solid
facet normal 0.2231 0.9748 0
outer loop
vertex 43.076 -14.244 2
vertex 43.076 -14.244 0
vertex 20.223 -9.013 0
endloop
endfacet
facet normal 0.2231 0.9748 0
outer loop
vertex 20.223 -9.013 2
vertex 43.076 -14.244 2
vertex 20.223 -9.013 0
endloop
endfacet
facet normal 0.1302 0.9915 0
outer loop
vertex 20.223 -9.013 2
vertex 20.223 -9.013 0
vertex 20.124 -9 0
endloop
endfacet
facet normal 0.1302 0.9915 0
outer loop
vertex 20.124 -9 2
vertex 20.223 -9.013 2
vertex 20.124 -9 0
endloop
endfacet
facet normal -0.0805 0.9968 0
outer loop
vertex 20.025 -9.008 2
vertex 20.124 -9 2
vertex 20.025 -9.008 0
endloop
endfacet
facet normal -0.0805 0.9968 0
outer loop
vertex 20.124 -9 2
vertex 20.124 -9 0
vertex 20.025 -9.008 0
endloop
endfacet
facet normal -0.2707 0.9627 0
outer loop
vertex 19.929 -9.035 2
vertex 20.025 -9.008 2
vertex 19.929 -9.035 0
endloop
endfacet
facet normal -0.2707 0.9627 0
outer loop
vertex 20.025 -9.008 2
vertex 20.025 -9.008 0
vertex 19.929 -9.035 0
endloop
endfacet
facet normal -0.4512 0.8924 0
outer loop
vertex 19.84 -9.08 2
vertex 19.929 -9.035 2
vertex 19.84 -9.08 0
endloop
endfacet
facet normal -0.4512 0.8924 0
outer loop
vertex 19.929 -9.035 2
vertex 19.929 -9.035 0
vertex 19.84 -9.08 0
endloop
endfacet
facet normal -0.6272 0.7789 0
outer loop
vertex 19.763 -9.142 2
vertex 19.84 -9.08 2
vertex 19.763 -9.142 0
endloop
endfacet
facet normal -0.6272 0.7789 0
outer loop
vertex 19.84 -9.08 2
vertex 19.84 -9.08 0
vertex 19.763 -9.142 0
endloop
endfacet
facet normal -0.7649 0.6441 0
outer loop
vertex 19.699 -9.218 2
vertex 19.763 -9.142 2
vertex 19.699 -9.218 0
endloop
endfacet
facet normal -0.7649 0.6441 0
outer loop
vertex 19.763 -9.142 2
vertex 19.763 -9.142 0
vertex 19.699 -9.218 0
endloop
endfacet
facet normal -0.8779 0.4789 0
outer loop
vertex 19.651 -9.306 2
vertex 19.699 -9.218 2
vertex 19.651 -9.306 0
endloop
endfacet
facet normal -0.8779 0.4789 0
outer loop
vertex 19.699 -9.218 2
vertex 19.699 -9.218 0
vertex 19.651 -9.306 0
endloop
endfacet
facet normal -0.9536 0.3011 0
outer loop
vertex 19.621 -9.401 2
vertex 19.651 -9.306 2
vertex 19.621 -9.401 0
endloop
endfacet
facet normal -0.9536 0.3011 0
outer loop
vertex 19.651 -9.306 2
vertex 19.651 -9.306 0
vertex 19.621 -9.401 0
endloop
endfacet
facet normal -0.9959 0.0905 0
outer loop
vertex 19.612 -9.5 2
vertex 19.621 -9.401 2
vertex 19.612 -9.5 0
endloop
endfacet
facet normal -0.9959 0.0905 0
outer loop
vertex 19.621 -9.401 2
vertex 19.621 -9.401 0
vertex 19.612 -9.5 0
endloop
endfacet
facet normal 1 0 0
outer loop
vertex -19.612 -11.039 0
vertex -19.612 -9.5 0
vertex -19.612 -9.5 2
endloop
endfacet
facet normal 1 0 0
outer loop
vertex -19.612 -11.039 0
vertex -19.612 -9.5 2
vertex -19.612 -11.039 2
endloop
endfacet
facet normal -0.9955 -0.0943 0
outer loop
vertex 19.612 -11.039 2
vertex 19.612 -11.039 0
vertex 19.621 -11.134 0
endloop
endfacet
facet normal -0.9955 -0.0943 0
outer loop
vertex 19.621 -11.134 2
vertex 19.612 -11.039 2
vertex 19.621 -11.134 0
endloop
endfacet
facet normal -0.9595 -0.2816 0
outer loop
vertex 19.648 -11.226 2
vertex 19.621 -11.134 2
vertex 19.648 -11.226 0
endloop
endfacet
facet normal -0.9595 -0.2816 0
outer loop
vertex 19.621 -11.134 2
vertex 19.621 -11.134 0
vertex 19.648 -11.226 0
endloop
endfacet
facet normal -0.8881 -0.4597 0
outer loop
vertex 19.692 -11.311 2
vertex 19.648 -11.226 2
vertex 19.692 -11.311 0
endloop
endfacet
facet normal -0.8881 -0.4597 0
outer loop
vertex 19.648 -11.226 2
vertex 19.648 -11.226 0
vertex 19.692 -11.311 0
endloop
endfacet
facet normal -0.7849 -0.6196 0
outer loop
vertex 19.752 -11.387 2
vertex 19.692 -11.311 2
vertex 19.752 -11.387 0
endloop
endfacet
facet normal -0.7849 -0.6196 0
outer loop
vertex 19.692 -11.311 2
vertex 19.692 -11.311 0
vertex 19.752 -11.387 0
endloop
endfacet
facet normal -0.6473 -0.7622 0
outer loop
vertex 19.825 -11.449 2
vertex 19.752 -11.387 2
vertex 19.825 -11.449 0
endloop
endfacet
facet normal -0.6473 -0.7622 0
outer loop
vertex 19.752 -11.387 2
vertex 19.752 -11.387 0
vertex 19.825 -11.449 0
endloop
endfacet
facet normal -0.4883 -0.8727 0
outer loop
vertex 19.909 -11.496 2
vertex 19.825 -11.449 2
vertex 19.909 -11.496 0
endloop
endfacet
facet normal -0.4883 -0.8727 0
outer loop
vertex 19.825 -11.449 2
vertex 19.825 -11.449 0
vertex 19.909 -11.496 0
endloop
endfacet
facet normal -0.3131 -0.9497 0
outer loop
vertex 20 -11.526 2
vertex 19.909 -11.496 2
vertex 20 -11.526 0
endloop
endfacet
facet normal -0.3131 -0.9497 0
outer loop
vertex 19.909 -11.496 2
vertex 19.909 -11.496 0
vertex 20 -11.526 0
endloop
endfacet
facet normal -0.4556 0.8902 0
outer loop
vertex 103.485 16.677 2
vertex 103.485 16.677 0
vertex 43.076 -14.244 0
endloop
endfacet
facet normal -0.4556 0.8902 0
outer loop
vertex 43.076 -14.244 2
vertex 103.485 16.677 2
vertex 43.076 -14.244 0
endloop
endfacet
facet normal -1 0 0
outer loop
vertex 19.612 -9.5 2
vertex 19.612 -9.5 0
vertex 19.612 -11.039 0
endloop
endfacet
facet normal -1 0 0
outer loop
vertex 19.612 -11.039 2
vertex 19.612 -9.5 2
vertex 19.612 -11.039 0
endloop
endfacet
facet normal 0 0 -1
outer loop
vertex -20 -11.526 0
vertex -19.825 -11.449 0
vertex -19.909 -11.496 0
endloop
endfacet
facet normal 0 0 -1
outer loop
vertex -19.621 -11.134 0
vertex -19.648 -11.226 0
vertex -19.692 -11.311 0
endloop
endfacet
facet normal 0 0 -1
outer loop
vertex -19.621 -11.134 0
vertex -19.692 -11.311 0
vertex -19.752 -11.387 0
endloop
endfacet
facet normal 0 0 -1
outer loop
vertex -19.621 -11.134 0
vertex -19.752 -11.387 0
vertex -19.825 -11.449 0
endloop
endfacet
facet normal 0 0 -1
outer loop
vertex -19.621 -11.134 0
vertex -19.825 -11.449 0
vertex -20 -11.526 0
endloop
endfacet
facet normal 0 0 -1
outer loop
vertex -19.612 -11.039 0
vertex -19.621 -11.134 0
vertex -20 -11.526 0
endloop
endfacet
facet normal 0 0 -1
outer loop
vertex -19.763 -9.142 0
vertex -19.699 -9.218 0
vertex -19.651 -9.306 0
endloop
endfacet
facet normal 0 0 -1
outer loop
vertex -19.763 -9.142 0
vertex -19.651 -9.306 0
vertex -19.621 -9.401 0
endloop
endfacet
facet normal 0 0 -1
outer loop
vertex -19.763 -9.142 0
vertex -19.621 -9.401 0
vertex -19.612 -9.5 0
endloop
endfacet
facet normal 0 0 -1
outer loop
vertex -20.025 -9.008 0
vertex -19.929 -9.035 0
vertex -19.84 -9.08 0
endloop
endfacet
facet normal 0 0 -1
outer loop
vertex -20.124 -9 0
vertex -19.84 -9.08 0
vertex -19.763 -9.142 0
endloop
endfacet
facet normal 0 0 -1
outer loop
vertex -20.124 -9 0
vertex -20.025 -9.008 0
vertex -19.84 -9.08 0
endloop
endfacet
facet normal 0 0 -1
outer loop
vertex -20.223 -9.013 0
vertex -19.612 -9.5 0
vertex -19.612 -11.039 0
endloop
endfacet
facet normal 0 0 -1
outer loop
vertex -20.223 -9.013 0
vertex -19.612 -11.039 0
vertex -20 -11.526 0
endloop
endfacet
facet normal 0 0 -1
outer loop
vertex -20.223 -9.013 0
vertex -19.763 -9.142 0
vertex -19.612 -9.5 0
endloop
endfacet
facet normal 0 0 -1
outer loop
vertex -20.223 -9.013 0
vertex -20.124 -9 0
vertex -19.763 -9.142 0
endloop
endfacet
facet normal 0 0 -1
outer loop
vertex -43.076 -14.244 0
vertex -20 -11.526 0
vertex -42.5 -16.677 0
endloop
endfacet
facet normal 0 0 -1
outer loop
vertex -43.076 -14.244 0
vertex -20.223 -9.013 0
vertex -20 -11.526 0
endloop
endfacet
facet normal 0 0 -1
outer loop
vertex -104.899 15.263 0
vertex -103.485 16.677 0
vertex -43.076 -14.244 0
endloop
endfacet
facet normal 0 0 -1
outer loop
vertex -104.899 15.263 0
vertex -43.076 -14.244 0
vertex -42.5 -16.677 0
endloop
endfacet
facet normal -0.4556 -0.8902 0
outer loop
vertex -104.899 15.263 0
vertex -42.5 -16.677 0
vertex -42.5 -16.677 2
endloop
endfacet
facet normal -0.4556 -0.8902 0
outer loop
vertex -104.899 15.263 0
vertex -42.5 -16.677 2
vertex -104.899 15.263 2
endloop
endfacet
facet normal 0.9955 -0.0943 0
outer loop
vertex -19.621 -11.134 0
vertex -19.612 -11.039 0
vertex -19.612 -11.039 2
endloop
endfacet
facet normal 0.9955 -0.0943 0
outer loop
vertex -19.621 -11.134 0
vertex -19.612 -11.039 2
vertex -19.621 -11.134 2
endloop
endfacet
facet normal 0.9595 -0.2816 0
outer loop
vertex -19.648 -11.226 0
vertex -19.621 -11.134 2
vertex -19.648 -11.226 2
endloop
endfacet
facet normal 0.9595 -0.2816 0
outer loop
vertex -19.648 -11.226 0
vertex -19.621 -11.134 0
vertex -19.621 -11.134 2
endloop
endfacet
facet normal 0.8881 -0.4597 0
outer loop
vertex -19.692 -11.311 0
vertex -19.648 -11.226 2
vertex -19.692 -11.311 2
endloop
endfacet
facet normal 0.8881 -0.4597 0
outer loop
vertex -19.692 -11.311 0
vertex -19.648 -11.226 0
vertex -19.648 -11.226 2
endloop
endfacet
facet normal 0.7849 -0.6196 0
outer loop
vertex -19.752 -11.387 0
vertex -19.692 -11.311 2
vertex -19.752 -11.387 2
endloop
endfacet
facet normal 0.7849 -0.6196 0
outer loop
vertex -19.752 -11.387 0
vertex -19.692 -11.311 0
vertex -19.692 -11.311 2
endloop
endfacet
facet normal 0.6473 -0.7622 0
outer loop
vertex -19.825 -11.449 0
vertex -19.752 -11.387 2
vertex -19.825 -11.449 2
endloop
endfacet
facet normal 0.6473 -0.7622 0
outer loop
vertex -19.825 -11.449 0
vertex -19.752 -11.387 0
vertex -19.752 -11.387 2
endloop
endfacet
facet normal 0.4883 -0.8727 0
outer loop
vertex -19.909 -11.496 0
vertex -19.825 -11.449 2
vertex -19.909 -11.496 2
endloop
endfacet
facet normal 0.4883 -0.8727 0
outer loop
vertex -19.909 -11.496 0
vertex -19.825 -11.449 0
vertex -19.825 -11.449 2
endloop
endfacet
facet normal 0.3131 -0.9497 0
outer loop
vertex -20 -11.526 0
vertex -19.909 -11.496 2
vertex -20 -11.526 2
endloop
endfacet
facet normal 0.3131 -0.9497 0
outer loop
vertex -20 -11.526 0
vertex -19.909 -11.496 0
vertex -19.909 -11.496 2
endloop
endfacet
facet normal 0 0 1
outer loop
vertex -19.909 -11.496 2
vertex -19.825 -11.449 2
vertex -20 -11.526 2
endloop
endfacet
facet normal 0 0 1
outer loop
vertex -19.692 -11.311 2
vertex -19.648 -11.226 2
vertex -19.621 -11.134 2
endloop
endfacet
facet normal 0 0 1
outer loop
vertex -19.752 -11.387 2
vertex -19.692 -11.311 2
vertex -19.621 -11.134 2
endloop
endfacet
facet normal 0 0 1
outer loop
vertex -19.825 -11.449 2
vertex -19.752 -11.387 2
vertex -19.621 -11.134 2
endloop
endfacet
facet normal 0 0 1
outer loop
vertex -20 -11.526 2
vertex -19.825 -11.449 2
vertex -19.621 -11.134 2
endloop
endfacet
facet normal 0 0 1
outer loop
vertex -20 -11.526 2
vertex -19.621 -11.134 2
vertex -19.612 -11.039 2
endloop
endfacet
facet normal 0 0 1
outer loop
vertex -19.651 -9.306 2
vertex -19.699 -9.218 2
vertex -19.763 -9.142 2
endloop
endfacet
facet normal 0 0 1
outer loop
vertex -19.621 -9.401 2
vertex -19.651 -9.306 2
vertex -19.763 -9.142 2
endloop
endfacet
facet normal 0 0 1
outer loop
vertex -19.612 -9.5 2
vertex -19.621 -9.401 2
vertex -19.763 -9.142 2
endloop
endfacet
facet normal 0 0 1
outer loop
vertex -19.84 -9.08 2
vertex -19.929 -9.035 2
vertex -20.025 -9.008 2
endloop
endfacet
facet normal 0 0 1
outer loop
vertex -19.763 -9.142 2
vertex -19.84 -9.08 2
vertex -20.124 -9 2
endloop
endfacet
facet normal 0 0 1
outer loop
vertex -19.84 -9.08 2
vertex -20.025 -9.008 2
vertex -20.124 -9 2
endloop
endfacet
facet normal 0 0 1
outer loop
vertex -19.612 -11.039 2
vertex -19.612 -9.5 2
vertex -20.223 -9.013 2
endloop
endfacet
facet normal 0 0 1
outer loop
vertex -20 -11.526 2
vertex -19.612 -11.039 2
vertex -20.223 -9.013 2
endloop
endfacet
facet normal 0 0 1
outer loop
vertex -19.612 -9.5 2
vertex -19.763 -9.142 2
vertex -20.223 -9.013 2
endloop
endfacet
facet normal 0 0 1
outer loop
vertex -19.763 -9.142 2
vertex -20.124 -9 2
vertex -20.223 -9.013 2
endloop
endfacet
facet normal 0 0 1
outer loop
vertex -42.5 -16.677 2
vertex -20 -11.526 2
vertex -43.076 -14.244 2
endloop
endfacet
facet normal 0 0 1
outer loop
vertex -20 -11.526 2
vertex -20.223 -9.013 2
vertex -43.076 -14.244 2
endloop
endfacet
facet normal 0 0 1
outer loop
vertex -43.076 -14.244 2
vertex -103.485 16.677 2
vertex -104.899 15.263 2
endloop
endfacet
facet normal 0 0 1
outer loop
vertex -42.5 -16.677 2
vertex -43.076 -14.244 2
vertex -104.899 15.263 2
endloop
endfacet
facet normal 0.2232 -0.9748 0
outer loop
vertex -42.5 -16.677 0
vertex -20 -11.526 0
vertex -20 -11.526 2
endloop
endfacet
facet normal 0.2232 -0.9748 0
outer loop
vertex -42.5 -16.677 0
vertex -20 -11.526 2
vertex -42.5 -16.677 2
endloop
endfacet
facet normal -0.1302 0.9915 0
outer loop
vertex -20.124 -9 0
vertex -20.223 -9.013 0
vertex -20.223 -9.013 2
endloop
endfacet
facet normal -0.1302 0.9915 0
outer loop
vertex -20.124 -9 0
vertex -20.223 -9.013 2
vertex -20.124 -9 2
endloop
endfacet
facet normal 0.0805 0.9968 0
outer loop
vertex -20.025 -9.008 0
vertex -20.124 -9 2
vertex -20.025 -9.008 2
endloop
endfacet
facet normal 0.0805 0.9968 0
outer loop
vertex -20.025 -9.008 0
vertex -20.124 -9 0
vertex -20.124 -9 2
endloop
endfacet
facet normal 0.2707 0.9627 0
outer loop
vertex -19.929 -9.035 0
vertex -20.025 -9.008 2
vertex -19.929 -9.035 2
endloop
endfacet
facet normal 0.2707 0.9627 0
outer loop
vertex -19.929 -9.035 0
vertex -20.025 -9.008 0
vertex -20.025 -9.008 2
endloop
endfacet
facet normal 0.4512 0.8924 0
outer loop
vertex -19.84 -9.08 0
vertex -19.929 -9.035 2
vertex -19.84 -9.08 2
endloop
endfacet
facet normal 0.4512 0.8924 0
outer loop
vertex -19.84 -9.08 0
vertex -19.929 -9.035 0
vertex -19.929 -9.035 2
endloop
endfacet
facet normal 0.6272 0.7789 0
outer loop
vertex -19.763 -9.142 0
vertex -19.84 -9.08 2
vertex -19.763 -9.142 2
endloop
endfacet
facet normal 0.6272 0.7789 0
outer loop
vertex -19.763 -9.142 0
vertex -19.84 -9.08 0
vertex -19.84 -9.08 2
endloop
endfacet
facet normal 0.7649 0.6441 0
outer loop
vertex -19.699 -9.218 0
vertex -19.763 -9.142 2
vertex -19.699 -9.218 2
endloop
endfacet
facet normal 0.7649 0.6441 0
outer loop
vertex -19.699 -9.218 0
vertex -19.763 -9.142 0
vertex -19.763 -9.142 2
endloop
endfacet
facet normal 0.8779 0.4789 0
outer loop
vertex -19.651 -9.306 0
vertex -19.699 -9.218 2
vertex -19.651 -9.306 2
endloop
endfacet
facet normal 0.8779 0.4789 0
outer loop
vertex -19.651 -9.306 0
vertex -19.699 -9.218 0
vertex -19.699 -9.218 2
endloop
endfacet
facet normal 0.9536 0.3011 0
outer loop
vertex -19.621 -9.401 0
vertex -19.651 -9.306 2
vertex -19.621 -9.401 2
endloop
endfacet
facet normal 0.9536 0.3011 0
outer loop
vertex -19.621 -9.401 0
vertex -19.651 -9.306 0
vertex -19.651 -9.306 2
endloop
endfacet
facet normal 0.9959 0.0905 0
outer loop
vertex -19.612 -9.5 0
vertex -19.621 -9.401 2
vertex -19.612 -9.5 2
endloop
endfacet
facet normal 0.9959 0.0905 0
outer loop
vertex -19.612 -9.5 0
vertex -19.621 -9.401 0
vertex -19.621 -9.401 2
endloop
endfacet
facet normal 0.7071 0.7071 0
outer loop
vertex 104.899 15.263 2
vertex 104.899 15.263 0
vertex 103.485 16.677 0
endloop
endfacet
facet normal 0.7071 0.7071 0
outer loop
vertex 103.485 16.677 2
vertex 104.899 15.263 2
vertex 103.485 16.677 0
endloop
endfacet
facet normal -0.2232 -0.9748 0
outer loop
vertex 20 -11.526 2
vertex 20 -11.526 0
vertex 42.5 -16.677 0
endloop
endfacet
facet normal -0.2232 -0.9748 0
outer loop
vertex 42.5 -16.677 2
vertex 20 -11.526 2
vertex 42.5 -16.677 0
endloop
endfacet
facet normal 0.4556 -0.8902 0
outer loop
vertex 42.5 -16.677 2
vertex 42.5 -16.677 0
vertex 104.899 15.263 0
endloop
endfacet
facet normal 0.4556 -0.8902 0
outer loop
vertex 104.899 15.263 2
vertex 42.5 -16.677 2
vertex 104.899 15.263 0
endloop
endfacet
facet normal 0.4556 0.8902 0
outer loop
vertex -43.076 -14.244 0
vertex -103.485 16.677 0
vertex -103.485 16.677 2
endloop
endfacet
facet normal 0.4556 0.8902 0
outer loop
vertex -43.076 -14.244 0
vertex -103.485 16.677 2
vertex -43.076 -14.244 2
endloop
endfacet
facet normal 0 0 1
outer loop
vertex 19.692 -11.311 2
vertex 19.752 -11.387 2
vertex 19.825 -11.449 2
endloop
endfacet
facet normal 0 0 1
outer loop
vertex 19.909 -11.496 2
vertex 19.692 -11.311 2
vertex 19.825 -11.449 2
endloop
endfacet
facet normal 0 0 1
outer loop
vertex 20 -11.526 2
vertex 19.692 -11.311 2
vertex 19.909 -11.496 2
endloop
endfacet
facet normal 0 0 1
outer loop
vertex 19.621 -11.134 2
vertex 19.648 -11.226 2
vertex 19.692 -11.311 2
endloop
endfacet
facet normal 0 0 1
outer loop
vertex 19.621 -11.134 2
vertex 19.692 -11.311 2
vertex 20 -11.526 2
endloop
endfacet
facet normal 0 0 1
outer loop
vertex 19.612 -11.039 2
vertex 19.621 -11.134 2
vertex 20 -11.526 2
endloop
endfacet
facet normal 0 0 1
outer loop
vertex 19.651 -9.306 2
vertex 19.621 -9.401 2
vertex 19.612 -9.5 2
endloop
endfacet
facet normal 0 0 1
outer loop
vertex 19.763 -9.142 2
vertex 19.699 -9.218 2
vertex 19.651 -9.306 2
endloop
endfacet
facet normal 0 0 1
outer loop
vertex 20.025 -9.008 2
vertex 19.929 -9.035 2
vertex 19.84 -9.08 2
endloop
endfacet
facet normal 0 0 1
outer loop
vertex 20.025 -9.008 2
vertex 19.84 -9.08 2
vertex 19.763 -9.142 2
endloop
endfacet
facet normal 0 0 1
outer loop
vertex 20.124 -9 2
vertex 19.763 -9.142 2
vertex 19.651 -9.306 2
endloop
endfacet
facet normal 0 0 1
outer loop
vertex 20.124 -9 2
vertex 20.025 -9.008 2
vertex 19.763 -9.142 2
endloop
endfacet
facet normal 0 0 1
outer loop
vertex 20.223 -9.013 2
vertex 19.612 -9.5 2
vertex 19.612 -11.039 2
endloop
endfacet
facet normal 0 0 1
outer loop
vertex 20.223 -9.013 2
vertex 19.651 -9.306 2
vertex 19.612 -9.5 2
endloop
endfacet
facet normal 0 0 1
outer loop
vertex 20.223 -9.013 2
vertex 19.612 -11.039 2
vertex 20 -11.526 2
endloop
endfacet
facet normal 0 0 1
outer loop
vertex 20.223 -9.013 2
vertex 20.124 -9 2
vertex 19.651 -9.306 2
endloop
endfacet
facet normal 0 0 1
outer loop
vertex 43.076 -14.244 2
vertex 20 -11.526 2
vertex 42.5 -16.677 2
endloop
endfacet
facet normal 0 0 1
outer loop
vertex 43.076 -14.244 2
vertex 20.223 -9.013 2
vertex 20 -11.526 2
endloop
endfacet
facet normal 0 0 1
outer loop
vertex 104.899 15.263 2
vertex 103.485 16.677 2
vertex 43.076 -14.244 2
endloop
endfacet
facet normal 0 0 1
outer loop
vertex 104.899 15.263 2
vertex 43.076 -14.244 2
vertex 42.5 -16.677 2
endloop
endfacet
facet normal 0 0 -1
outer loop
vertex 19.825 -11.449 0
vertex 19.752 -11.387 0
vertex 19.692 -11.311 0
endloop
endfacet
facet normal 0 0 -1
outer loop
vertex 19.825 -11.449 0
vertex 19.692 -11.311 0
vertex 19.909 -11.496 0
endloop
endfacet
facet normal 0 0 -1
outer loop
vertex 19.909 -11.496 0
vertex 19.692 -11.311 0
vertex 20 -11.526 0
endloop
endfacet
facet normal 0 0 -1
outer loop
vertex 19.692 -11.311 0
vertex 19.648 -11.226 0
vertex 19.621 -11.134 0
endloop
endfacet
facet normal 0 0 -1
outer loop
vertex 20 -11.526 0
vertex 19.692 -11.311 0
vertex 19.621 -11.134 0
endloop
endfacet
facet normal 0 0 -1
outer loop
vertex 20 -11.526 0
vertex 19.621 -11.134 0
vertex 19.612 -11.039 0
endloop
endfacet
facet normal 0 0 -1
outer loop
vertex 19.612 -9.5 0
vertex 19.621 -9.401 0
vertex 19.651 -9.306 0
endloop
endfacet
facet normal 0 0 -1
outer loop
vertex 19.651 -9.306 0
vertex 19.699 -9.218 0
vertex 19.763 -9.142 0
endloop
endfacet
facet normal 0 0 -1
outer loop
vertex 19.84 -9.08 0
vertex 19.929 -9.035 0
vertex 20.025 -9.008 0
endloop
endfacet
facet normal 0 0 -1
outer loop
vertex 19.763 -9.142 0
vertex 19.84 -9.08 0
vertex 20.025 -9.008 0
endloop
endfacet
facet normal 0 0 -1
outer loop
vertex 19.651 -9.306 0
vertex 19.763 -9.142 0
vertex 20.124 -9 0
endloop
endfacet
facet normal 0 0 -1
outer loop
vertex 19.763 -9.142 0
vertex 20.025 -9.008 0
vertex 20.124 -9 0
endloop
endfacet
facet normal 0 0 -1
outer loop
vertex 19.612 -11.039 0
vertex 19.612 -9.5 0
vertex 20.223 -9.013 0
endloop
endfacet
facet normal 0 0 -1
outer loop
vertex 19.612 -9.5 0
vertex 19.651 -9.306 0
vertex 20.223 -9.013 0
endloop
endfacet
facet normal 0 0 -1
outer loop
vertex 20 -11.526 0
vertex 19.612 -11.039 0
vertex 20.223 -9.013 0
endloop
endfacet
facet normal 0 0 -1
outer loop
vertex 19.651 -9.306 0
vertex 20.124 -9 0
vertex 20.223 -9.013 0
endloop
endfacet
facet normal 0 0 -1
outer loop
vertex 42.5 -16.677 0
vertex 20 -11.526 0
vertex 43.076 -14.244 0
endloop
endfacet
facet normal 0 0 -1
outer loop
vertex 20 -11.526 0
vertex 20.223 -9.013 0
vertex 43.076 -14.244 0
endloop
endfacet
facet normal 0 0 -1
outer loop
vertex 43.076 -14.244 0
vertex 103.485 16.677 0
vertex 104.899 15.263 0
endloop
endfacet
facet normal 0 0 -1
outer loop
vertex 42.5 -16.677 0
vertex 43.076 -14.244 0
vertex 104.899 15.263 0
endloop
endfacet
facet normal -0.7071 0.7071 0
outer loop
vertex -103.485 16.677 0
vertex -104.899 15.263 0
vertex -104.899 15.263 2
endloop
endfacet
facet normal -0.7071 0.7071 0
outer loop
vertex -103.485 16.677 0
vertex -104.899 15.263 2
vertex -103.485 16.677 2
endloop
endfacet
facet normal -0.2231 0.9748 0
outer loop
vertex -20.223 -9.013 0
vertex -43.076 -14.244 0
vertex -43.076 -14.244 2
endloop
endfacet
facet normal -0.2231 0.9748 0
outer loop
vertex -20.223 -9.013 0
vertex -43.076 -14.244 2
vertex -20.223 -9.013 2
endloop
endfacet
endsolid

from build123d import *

# Parameters (mm, degrees)
EXTRUDE_1_DEPTH   = 2
EXTRUDE_1_2_DEPTH = 2


with BuildPart() as part:
    # 스케치1 → 보스-돌출1 (new body)
    with BuildSketch(Plane.XY):
        with BuildLine():
            Line((-103.485281374, 16.676935339), (-43.075853619, -14.244090721))
            Line((-43.075853619, -14.244090721), (-20.223148332, -9.012633862))
            ThreePointArc((-20.223148332, -9.012633862), (-19.799955074, -9.109010075), (-19.611574166, -9.500026112))
            Line((-19.611574166, -9.500026112), (-19.611574166, -11.038827765))
            ThreePointArc((-19.611574166, -11.038827765), (-19.720558129, -11.350446857), (-20, -11.526220015))
            Line((-20, -11.526220015), (-42.5, -16.676935339))
            Line((-42.5, -16.676935339), (-104.899494937, 15.262721777))
            Line((-104.899494937, 15.262721777), (-103.485281374, 16.676935339))
        make_face()
    extrude(amount=EXTRUDE_1_DEPTH)


with BuildPart() as body_2:
    # 스케치1 → Extrude 1 2 (new body)
    with BuildSketch(Plane.XY):
        with BuildLine():
            Line((104.899494937, 15.262721777), (103.485281374, 16.676935339))
            Line((103.485281374, 16.676935339), (43.075853619, -14.244090721))
            Line((43.075853619, -14.244090721), (20.223148332, -9.012633862))
            ThreePointArc((20.223148332, -9.012633862), (19.799955074, -9.109010075), (19.611574166, -9.500026112))
            Line((19.611574166, -9.500026112), (19.611574166, -11.038827765))
            ThreePointArc((19.611574166, -11.038827765), (19.720558129, -11.350446857), (20, -11.526220015))
            Line((20, -11.526220015), (42.5, -16.676935339))
            Line((42.5, -16.676935339), (104.899494937, 15.262721777))
        make_face()
    extrude(amount=EXTRUDE_1_2_DEPTH)


solid = Compound([part.part, body_2.part])
